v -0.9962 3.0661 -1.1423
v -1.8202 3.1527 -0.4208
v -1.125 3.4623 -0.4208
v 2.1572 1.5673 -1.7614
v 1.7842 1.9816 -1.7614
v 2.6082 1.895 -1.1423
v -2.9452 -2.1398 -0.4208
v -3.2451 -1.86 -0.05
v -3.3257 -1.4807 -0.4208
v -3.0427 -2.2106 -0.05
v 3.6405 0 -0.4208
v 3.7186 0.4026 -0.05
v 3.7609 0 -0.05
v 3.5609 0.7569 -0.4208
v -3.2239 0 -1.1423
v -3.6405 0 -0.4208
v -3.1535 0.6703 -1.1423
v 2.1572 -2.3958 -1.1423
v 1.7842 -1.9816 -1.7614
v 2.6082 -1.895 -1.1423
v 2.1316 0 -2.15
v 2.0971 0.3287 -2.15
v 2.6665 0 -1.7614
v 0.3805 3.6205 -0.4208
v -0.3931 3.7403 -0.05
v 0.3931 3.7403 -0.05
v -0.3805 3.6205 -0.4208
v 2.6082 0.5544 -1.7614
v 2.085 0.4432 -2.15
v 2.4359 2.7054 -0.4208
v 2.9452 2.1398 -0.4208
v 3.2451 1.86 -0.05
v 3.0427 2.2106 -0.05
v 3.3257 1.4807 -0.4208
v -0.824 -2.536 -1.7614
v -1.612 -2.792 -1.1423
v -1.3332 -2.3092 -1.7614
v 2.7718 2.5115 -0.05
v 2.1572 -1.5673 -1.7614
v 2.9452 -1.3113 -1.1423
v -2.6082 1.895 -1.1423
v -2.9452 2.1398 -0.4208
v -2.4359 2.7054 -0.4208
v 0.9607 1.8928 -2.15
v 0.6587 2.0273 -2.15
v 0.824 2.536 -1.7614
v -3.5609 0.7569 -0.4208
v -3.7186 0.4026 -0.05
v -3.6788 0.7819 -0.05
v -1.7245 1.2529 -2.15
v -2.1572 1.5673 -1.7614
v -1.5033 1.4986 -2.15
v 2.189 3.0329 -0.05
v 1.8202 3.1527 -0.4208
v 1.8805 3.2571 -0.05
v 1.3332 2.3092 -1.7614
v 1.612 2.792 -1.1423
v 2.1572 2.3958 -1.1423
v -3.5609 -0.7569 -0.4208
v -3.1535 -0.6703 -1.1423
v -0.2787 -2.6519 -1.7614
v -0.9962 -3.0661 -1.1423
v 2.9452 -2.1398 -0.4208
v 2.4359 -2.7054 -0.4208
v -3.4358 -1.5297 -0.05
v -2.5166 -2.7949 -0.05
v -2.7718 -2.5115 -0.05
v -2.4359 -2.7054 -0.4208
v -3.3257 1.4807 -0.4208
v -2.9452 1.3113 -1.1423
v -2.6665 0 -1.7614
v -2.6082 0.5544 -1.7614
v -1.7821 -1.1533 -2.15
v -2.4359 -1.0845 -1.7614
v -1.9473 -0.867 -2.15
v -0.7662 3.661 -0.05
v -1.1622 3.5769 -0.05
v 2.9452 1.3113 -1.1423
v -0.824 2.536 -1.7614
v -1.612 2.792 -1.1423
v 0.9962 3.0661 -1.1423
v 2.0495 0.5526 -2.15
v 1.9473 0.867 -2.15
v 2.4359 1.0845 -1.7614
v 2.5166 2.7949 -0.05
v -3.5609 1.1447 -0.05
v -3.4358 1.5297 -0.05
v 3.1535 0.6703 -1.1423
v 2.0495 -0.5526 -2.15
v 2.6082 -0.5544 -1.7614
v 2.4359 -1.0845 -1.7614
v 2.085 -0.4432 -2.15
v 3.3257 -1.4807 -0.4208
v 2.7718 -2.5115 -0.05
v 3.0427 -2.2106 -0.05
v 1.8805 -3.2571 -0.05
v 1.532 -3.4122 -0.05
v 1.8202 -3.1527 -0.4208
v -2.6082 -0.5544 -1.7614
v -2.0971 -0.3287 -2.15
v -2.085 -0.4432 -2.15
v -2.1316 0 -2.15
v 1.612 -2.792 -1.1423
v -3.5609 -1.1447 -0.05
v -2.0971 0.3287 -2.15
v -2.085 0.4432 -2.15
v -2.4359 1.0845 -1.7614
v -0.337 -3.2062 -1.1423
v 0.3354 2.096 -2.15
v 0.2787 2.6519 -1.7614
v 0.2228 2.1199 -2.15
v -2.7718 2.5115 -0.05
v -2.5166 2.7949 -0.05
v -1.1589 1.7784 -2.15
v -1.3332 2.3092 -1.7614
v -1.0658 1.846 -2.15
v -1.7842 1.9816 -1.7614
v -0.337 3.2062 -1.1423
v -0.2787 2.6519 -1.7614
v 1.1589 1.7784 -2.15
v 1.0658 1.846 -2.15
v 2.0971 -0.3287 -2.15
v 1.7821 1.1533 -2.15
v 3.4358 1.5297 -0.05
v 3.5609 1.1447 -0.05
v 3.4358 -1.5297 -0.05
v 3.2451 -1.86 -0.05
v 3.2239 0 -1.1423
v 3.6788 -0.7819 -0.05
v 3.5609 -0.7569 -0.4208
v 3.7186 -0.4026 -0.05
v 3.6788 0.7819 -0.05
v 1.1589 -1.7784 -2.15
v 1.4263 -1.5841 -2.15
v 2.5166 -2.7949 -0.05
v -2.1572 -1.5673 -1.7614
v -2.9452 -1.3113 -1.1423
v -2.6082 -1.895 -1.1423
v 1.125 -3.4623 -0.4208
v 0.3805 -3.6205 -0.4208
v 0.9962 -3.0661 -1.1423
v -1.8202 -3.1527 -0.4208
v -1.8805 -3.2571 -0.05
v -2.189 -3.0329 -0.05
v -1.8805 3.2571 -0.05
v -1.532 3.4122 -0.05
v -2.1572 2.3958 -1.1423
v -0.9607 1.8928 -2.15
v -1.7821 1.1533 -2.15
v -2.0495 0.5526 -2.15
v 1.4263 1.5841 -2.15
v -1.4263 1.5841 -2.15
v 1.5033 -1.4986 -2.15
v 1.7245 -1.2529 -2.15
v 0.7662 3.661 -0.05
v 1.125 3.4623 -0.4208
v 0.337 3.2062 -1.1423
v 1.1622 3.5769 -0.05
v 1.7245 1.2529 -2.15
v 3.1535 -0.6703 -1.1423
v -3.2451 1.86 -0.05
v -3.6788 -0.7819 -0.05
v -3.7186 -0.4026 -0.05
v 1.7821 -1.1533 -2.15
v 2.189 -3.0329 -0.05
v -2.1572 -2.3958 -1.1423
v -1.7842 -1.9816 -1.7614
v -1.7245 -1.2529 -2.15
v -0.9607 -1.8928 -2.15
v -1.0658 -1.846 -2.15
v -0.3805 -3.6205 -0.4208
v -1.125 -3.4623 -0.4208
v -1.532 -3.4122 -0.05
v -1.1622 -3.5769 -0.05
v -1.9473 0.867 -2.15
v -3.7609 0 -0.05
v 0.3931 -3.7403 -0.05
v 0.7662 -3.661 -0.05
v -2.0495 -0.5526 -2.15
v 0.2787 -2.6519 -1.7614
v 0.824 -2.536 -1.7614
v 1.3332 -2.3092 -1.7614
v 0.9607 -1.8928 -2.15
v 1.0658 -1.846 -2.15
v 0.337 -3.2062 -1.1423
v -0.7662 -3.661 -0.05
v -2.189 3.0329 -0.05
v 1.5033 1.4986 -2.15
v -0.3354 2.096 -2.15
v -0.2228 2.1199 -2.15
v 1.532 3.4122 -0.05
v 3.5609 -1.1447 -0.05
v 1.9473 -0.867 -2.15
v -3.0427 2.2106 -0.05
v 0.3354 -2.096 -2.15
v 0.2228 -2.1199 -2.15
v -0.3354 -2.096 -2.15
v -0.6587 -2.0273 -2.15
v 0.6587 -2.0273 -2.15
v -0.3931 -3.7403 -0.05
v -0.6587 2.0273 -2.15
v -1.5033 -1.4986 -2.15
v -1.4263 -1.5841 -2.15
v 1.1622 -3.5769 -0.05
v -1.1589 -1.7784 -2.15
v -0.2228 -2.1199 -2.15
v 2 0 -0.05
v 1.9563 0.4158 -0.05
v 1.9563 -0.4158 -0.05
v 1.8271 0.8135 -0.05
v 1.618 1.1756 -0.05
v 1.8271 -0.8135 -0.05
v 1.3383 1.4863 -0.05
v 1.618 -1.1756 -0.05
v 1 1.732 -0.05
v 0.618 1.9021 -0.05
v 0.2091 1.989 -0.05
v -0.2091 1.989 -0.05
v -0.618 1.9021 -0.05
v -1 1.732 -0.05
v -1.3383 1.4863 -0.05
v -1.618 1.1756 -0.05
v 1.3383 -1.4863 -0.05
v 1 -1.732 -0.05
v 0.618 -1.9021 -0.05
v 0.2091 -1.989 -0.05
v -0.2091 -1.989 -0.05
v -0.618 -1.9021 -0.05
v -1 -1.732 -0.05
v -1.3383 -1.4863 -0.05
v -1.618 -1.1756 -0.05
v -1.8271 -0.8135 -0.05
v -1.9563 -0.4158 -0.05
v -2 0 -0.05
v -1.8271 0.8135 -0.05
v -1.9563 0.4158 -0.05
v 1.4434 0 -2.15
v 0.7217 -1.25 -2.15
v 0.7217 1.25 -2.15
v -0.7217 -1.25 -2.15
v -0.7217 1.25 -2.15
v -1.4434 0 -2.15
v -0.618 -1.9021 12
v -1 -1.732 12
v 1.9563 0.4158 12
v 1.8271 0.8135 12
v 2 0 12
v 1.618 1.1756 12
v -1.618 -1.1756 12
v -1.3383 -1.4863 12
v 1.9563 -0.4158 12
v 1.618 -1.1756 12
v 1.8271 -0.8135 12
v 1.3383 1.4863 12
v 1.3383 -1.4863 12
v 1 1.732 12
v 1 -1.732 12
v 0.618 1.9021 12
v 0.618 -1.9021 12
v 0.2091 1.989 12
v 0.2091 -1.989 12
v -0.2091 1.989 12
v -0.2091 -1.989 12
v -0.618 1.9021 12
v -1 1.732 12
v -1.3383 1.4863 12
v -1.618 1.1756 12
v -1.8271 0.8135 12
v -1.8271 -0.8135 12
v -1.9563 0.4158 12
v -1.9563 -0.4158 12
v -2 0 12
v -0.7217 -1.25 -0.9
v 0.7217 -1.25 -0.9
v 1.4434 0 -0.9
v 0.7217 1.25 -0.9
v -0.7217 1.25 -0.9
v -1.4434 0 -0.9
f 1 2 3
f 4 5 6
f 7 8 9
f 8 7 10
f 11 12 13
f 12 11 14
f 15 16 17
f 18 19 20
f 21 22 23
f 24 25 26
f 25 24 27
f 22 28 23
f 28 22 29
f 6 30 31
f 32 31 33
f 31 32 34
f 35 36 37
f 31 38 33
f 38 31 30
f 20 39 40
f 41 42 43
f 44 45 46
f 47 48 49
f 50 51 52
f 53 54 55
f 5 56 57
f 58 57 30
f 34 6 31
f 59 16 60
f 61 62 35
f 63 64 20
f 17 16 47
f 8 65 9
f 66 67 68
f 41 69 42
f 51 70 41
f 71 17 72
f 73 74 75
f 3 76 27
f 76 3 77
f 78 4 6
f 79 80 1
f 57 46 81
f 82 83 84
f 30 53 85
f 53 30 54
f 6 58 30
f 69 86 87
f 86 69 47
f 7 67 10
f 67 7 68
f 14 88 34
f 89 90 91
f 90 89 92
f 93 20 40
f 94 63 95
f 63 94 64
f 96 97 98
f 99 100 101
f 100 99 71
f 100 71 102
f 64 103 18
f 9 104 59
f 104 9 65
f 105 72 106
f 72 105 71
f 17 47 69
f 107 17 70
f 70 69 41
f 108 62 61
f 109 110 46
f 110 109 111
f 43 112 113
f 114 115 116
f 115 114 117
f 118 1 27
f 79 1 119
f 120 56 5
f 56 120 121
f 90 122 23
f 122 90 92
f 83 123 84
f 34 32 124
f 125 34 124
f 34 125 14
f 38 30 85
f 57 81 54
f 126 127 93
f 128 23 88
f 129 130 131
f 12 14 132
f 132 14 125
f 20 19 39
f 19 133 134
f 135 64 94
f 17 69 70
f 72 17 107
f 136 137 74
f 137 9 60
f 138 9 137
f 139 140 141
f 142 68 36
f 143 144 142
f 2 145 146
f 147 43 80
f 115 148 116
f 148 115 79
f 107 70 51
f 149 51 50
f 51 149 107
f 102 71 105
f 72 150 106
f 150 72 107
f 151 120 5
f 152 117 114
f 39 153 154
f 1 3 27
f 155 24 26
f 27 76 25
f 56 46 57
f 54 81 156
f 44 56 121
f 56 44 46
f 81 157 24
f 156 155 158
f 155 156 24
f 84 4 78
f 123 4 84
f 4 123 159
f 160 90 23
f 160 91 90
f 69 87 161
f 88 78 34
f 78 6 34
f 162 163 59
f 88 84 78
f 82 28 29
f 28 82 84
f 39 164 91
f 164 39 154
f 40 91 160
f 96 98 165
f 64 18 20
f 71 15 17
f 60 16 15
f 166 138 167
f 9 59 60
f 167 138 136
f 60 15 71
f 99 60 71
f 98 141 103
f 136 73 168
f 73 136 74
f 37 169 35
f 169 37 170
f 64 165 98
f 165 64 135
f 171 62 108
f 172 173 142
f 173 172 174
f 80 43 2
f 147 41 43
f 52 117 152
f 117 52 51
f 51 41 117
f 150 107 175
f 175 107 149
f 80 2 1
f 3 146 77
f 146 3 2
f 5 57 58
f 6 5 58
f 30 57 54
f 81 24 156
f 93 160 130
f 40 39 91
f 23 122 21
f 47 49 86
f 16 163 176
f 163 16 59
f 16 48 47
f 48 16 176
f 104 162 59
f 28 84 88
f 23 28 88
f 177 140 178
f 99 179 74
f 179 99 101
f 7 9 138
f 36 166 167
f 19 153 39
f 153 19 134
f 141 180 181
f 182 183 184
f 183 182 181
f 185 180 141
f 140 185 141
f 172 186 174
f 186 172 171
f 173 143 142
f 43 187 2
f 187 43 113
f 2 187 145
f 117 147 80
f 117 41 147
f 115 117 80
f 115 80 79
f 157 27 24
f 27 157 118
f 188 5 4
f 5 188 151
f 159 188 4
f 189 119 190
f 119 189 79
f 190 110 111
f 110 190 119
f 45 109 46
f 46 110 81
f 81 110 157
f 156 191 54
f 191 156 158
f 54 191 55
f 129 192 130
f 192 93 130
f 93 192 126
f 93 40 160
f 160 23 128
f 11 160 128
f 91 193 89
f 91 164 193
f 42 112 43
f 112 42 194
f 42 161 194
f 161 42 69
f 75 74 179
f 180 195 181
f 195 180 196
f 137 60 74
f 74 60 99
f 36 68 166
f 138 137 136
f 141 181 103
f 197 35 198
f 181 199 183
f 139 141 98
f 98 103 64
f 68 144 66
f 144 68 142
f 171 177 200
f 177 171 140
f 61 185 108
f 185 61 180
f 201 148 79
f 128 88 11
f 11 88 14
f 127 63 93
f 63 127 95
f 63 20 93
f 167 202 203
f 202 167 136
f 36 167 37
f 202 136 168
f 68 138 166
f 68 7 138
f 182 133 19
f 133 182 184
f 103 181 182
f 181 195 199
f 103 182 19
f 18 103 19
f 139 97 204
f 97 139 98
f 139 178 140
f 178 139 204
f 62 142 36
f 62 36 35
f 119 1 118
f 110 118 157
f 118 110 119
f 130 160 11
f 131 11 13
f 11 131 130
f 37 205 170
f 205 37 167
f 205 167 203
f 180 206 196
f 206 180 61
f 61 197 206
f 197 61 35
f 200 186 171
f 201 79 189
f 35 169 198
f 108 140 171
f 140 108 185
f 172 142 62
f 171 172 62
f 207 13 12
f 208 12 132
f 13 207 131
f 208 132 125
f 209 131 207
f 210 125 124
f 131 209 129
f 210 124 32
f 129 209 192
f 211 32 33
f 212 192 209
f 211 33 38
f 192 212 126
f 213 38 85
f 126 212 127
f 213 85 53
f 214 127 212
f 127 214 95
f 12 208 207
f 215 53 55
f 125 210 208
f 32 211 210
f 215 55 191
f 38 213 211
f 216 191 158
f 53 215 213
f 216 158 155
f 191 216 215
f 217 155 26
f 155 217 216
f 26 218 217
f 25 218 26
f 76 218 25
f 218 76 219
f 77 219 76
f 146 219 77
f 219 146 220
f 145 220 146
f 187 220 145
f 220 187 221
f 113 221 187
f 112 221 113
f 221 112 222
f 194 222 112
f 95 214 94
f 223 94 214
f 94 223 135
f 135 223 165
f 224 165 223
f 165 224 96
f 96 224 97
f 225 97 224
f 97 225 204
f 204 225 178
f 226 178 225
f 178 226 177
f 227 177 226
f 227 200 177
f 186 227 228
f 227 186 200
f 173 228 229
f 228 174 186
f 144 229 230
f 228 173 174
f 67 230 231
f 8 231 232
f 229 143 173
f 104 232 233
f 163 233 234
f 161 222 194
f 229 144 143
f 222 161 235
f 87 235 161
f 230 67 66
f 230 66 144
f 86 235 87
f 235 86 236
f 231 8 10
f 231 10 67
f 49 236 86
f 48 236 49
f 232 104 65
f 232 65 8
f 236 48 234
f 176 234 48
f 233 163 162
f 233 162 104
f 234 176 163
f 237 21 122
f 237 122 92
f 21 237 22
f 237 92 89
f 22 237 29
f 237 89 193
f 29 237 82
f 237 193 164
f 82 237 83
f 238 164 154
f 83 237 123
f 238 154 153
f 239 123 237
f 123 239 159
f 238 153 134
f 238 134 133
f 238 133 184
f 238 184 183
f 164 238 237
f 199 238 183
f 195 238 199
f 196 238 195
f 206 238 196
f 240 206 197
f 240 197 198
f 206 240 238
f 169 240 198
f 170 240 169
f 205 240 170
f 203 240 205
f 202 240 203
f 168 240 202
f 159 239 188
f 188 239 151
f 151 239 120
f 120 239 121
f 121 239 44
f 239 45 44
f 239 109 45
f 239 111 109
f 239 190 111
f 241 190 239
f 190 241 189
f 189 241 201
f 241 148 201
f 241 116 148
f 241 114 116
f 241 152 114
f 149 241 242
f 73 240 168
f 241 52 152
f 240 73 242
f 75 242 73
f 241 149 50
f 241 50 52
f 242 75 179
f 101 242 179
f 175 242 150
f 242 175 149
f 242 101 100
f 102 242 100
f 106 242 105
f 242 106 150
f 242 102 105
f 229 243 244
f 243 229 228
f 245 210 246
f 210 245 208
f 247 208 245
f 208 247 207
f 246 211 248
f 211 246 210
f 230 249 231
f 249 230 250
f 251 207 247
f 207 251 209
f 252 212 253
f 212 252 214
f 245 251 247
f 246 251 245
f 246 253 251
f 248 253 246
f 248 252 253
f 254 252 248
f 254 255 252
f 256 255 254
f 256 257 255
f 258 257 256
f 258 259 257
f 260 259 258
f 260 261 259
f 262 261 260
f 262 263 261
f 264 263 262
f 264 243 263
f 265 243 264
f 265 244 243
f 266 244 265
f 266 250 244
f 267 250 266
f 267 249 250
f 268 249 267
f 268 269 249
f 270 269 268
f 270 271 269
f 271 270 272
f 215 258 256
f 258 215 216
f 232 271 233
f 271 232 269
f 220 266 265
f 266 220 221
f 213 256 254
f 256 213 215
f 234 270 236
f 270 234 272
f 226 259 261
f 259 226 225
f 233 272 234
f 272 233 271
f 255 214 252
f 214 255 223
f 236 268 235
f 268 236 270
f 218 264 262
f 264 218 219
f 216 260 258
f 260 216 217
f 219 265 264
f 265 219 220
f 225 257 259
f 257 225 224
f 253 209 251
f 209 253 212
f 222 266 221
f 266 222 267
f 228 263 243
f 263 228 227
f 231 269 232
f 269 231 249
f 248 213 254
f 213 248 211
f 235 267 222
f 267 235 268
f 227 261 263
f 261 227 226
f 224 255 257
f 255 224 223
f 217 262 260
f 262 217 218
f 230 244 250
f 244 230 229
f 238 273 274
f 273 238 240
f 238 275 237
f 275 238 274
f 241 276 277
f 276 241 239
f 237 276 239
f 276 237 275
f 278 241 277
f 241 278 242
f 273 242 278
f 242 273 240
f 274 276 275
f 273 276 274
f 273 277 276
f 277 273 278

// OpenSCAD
/*
   Copyright 2018 Scott Bezek and the splitflap contributors

   Licensed under the Apache License, Version 2.0 (the "License");
   you may not use this file except in compliance with the License.
   You may obtain a copy of the License at

       http://www.apache.org/licenses/LICENSE-2.0

   Unless required by applicable law or agreed to in writing, software
   distributed under the License is distributed on an "AS IS" BASIS,
   WITHOUT WARRANTIES OR CONDITIONS OF ANY KIND, either express or implied.
   See the License for the specific language governing permissions and
   limitations under the License.
*/

module roughM4_7380(length) {
    eps = 0.1;
    thread_diameter = 4;
    head_diameter = 7.6;
    head_length = 2.2;
    driving_depth = 1.3;
    driving_apothem = 2.5/2;
    driving_radius = driving_apothem / cos(180/6);

    sphere_offset = 1.2;  // Just a guess
    sphere_radius = sqrt(sphere_offset*sphere_offset + (head_diameter/2)*(head_diameter/2));


    difference() {
        union() {
            translate([0, 0, -eps]) {
                cylinder(h=length+eps, d=thread_diameter, $fn=30);
            }
            difference() {
                translate([0, 0, sphere_offset]) {
                    sphere(sphere_radius, $fn=30);
                }
                translate([0, 0, sphere_radius]) {
                    cube([sphere_radius*2 + eps, sphere_radius*2 + eps, sphere_radius*2 + eps], center=true);
                }
                translate([0, 0, -sphere_radius - head_length]) {
                    cube([sphere_radius*2 + eps, sphere_radius*2 + eps, sphere_radius*2 + eps], center=true);
                }
            }
        }
        translate([0, 0, -head_length-eps]) {
            cylinder(h=driving_depth+eps, r=driving_radius, $fn=6);
        }
    }
}

roughM4_7380(12);

        module color_selector(c) {
            precision = 0.0000001;  // arbitrary
            function compare_floats(x, y, i=0) = 
                  (len(x) != len(y)) ? false  // if arrays differ in length, they can't be equal
                : (i >= len(x)) ? true  // if we've hit the end of the arrays without issue, we're equal
                : (x[i] - precision <= y[i]) && x[i] + precision >= y[i]
                    ? compare_floats(x, y, i+1)
                    : false;  // not equal, short circuit

            if (c == [1, 1, 1] || compare_floats(c, [1, 1, 1]))
                children();
        }
                    
